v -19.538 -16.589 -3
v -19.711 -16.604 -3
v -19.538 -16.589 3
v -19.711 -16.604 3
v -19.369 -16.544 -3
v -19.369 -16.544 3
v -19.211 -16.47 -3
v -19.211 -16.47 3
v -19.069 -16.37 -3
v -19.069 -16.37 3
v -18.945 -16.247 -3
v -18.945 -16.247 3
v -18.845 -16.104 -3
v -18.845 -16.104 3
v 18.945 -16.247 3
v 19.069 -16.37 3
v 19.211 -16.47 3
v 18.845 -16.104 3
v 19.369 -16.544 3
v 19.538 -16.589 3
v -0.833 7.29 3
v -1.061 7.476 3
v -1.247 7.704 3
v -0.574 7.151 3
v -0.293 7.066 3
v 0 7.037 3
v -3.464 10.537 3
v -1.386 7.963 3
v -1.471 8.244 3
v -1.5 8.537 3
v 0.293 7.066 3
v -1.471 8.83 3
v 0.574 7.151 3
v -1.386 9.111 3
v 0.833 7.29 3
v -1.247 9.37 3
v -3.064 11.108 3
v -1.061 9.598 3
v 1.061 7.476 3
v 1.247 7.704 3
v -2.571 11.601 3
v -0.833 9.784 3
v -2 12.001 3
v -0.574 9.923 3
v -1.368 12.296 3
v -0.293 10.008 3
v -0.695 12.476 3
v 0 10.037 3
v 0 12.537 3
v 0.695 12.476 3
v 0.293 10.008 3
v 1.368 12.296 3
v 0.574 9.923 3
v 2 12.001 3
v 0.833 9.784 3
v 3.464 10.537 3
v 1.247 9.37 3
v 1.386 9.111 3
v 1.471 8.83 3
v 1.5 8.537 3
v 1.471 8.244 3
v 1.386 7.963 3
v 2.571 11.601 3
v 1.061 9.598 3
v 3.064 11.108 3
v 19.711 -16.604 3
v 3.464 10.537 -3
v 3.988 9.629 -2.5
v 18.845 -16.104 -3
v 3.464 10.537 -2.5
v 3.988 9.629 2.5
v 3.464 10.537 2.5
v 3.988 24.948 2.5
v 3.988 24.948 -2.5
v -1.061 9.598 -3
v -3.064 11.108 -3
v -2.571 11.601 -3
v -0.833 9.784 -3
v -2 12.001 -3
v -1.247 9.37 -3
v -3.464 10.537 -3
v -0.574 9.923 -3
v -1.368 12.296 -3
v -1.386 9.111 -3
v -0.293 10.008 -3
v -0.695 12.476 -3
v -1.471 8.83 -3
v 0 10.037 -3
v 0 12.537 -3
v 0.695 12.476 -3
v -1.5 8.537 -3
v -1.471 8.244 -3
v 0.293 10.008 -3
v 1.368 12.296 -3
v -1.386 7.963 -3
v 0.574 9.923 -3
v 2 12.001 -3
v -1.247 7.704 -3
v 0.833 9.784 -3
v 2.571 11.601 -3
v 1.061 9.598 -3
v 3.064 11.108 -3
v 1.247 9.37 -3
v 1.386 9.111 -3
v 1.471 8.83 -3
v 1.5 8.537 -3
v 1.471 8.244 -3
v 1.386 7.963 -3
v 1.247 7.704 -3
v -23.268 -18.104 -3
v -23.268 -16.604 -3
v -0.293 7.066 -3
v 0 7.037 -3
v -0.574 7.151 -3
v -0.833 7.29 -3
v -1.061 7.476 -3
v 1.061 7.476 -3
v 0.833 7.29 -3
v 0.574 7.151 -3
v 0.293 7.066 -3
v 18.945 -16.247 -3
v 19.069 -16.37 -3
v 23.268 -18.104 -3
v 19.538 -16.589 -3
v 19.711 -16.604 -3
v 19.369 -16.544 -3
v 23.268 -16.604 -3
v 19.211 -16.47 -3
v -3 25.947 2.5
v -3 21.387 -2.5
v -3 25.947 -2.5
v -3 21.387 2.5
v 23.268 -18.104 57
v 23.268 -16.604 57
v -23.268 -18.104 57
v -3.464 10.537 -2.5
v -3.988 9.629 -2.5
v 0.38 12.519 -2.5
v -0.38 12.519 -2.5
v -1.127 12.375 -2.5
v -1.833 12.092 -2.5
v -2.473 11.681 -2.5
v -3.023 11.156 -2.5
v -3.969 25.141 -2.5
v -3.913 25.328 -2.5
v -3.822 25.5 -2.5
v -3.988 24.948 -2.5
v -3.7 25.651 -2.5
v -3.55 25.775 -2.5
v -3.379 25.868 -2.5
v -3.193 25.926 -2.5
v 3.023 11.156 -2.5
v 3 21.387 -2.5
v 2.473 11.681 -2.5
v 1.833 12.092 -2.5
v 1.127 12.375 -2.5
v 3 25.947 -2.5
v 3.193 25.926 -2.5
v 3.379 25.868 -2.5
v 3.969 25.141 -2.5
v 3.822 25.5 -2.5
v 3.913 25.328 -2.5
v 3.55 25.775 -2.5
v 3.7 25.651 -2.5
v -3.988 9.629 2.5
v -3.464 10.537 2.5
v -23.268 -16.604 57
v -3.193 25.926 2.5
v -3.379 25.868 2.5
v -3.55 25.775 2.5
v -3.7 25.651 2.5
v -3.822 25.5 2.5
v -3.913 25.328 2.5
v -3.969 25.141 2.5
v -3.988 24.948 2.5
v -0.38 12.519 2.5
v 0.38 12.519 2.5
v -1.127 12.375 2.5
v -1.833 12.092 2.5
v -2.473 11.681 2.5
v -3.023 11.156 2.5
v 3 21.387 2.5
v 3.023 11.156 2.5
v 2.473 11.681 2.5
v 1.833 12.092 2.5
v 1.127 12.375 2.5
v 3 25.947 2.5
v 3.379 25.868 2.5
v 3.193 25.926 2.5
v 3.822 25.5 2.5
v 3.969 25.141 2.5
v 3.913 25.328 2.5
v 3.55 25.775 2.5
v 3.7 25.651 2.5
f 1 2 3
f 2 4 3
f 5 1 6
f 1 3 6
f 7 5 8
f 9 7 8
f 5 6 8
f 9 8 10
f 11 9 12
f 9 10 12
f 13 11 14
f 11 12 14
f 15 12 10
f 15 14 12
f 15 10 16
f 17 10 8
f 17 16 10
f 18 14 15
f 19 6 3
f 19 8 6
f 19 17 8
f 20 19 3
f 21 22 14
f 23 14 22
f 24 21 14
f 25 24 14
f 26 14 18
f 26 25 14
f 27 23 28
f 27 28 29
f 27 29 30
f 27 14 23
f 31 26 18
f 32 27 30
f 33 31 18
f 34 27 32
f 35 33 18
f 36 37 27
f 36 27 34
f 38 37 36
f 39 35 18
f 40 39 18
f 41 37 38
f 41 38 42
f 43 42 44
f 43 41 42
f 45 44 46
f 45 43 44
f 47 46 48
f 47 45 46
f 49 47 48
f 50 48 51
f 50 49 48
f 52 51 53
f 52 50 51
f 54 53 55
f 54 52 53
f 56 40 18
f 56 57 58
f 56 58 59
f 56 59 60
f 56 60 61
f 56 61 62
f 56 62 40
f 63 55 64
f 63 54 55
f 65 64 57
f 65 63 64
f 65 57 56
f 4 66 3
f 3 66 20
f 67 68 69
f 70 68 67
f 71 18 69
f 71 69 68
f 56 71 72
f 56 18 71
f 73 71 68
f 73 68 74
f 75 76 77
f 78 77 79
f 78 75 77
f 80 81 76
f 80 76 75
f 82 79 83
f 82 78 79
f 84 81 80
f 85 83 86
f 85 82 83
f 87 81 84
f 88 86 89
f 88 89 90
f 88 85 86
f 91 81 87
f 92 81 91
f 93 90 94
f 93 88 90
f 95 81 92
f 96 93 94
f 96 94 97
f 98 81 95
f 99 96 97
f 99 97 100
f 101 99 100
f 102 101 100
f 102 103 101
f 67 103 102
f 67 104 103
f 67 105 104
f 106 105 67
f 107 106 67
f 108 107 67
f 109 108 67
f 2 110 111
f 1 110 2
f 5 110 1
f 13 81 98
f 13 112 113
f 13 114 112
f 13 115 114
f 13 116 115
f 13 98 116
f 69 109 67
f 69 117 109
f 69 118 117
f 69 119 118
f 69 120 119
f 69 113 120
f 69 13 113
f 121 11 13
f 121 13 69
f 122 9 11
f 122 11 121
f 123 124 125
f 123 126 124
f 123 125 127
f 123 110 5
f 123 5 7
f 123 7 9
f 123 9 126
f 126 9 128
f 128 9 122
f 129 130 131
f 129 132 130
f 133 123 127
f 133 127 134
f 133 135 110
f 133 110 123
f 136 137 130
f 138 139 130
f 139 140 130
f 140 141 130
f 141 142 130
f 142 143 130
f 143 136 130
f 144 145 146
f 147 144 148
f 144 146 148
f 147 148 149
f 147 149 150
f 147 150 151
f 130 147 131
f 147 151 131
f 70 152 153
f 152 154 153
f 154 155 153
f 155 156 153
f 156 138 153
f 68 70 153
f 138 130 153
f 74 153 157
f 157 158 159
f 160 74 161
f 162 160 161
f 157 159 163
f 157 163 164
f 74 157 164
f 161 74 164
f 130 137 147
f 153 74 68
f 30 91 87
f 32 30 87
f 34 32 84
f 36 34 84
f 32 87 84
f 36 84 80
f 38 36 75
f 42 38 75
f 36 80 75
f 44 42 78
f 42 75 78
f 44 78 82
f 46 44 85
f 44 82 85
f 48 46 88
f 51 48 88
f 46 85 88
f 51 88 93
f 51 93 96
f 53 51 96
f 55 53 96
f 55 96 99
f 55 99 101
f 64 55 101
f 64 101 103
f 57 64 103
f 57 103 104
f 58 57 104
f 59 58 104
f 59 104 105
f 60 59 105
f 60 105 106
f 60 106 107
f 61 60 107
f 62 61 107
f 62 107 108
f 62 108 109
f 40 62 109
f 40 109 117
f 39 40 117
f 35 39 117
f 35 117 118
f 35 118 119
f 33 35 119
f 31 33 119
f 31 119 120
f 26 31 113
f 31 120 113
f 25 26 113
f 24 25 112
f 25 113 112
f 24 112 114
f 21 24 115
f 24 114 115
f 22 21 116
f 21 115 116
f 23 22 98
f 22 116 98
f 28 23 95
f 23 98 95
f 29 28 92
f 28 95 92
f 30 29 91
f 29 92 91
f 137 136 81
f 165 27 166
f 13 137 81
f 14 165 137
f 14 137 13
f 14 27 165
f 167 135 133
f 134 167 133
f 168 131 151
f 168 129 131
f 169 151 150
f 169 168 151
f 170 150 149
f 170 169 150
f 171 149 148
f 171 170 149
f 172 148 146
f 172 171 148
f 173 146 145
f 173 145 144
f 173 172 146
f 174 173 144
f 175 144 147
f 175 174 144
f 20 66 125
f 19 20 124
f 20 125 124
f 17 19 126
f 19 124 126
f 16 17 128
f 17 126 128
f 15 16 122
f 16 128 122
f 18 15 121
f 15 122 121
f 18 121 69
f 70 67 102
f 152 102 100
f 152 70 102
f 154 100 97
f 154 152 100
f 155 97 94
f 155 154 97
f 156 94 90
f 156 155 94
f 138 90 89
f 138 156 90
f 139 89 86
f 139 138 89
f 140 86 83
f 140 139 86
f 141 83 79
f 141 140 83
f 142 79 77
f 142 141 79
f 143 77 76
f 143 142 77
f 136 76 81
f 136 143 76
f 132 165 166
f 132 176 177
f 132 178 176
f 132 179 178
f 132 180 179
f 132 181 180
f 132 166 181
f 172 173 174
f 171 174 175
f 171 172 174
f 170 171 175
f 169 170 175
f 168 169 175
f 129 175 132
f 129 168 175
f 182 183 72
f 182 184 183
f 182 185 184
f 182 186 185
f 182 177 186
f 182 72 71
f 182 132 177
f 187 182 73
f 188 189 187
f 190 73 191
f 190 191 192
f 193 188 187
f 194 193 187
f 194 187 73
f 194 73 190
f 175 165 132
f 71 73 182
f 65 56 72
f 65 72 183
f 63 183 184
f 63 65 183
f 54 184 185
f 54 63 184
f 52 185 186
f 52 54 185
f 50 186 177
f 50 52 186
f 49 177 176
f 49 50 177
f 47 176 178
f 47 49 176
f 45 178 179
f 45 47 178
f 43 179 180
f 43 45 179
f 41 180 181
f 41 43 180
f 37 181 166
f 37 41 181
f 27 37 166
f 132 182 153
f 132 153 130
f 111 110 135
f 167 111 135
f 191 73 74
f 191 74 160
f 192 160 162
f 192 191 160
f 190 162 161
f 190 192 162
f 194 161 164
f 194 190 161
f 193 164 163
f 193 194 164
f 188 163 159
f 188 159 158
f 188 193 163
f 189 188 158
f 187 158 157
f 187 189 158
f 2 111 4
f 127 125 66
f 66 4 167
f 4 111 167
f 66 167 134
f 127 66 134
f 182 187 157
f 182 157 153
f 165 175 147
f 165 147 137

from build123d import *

# Parameters (mm, degrees)
EXTRUDE_1_DEPTH     = 3
EXTRUDE_2_DEPTH     = 2.5
SKETCH_3_W          = 46.535898384
SKETCH_3_H          = 60
EXTRUDE_3_DEPTH     = 1.5
FILLET_1_R          = 1
SKETCH_4_R          = 1.5
CUT_EXTRUDE_1_DEPTH = 70.387823433


with BuildPart() as part:
    # 草圖1 → 填料-伸長1 (new, symmetric)
    with BuildSketch(Plane.XY):
        with BuildLine():
            ThreePointArc((3.464101615, 10.536922378), (2, 12.001023993), (0, 12.536922378))
            Line((0, 12.536922378), (0, -18.104093774))
            Line((0, -18.104093774), (18.267949192, -18.104093774))
            ThreePointArc((18.267949192, -18.104093774), (19.133974596, -17.604093774), (19.133974596, -16.604093774))
            Line((19.133974596, -16.604093774), (3.464101615, 10.536922378))
        make_face()
        with BuildLine():
            ThreePointArc((0, 12.536922378), (-2, 12.001023993), (-3.464101615, 10.536922378))
            Line((-3.464101615, 10.536922378), (-19.133974596, -16.604093774))
            ThreePointArc((-19.133974596, -16.604093774), (-19.133974596, -17.604093774), (-18.267949192, -18.104093774))
            Line((-18.267949192, -18.104093774), (0, -18.104093774))
            Line((0, -18.104093774), (0, 12.536922378))
        make_face()
    extrude(amount=EXTRUDE_1_DEPTH, both=True)

    # 草圖2 → 填料-伸長2 (add, symmetric)
    with BuildSketch(Plane.XY):
        with BuildLine():
            Line((-3.98839196, 24.947564001), (-3.98839196, 8.841437682))
            Line((-3.98839196, 8.841437682), (3.98839196, 8.841437682))
            Line((3.98839196, 8.841437682), (3.98839196, 24.947564001))
            ThreePointArc((3.98839196, 24.947564001), (3.699590962, 25.65055474), (3, 25.947496625))
            Line((3, 25.947496625), (3, 21.386539183))
            Line((3, 21.386539183), (0, 21.386539183))
            Line((0, 21.386539183), (-3, 21.386539183))
            Line((-3, 21.386539183), (-3, 25.947496625))
            ThreePointArc((-3, 25.947496625), (-3.699590962, 25.65055474), (-3.98839196, 24.947564001))
        make_face()
    extrude(amount=EXTRUDE_2_DEPTH, both=True)

    # 草圖3 → 填料-伸長3 (add)
    with BuildSketch(Plane.XZ.offset(18.104093774)):
        with Locations((0, 27)):
            Rectangle(SKETCH_3_W, SKETCH_3_H)
    extrude(amount=-EXTRUDE_3_DEPTH)

    # 圓角1
    fillet_1_edges = [part.edges().sort_by_distance(p)[0] for p in [
        (19.133974596, -16.604093774, 0),
        (-19.133974596, -16.604093774, 0),
    ]]
    fillet(fillet_1_edges, radius=FILLET_1_R)

    # 草圖4 → 除料-伸長1 (cut, through all)
    with BuildSketch(Plane(origin=(0, 0, -3), x_dir=(-1, 0, 0), z_dir=(0, 0, -1))):
        with Locations((0, 8.536922378)):
            Circle(SKETCH_4_R)
    extrude(amount=-CUT_EXTRUDE_1_DEPTH, mode=Mode.SUBTRACT)


solid = part.part
